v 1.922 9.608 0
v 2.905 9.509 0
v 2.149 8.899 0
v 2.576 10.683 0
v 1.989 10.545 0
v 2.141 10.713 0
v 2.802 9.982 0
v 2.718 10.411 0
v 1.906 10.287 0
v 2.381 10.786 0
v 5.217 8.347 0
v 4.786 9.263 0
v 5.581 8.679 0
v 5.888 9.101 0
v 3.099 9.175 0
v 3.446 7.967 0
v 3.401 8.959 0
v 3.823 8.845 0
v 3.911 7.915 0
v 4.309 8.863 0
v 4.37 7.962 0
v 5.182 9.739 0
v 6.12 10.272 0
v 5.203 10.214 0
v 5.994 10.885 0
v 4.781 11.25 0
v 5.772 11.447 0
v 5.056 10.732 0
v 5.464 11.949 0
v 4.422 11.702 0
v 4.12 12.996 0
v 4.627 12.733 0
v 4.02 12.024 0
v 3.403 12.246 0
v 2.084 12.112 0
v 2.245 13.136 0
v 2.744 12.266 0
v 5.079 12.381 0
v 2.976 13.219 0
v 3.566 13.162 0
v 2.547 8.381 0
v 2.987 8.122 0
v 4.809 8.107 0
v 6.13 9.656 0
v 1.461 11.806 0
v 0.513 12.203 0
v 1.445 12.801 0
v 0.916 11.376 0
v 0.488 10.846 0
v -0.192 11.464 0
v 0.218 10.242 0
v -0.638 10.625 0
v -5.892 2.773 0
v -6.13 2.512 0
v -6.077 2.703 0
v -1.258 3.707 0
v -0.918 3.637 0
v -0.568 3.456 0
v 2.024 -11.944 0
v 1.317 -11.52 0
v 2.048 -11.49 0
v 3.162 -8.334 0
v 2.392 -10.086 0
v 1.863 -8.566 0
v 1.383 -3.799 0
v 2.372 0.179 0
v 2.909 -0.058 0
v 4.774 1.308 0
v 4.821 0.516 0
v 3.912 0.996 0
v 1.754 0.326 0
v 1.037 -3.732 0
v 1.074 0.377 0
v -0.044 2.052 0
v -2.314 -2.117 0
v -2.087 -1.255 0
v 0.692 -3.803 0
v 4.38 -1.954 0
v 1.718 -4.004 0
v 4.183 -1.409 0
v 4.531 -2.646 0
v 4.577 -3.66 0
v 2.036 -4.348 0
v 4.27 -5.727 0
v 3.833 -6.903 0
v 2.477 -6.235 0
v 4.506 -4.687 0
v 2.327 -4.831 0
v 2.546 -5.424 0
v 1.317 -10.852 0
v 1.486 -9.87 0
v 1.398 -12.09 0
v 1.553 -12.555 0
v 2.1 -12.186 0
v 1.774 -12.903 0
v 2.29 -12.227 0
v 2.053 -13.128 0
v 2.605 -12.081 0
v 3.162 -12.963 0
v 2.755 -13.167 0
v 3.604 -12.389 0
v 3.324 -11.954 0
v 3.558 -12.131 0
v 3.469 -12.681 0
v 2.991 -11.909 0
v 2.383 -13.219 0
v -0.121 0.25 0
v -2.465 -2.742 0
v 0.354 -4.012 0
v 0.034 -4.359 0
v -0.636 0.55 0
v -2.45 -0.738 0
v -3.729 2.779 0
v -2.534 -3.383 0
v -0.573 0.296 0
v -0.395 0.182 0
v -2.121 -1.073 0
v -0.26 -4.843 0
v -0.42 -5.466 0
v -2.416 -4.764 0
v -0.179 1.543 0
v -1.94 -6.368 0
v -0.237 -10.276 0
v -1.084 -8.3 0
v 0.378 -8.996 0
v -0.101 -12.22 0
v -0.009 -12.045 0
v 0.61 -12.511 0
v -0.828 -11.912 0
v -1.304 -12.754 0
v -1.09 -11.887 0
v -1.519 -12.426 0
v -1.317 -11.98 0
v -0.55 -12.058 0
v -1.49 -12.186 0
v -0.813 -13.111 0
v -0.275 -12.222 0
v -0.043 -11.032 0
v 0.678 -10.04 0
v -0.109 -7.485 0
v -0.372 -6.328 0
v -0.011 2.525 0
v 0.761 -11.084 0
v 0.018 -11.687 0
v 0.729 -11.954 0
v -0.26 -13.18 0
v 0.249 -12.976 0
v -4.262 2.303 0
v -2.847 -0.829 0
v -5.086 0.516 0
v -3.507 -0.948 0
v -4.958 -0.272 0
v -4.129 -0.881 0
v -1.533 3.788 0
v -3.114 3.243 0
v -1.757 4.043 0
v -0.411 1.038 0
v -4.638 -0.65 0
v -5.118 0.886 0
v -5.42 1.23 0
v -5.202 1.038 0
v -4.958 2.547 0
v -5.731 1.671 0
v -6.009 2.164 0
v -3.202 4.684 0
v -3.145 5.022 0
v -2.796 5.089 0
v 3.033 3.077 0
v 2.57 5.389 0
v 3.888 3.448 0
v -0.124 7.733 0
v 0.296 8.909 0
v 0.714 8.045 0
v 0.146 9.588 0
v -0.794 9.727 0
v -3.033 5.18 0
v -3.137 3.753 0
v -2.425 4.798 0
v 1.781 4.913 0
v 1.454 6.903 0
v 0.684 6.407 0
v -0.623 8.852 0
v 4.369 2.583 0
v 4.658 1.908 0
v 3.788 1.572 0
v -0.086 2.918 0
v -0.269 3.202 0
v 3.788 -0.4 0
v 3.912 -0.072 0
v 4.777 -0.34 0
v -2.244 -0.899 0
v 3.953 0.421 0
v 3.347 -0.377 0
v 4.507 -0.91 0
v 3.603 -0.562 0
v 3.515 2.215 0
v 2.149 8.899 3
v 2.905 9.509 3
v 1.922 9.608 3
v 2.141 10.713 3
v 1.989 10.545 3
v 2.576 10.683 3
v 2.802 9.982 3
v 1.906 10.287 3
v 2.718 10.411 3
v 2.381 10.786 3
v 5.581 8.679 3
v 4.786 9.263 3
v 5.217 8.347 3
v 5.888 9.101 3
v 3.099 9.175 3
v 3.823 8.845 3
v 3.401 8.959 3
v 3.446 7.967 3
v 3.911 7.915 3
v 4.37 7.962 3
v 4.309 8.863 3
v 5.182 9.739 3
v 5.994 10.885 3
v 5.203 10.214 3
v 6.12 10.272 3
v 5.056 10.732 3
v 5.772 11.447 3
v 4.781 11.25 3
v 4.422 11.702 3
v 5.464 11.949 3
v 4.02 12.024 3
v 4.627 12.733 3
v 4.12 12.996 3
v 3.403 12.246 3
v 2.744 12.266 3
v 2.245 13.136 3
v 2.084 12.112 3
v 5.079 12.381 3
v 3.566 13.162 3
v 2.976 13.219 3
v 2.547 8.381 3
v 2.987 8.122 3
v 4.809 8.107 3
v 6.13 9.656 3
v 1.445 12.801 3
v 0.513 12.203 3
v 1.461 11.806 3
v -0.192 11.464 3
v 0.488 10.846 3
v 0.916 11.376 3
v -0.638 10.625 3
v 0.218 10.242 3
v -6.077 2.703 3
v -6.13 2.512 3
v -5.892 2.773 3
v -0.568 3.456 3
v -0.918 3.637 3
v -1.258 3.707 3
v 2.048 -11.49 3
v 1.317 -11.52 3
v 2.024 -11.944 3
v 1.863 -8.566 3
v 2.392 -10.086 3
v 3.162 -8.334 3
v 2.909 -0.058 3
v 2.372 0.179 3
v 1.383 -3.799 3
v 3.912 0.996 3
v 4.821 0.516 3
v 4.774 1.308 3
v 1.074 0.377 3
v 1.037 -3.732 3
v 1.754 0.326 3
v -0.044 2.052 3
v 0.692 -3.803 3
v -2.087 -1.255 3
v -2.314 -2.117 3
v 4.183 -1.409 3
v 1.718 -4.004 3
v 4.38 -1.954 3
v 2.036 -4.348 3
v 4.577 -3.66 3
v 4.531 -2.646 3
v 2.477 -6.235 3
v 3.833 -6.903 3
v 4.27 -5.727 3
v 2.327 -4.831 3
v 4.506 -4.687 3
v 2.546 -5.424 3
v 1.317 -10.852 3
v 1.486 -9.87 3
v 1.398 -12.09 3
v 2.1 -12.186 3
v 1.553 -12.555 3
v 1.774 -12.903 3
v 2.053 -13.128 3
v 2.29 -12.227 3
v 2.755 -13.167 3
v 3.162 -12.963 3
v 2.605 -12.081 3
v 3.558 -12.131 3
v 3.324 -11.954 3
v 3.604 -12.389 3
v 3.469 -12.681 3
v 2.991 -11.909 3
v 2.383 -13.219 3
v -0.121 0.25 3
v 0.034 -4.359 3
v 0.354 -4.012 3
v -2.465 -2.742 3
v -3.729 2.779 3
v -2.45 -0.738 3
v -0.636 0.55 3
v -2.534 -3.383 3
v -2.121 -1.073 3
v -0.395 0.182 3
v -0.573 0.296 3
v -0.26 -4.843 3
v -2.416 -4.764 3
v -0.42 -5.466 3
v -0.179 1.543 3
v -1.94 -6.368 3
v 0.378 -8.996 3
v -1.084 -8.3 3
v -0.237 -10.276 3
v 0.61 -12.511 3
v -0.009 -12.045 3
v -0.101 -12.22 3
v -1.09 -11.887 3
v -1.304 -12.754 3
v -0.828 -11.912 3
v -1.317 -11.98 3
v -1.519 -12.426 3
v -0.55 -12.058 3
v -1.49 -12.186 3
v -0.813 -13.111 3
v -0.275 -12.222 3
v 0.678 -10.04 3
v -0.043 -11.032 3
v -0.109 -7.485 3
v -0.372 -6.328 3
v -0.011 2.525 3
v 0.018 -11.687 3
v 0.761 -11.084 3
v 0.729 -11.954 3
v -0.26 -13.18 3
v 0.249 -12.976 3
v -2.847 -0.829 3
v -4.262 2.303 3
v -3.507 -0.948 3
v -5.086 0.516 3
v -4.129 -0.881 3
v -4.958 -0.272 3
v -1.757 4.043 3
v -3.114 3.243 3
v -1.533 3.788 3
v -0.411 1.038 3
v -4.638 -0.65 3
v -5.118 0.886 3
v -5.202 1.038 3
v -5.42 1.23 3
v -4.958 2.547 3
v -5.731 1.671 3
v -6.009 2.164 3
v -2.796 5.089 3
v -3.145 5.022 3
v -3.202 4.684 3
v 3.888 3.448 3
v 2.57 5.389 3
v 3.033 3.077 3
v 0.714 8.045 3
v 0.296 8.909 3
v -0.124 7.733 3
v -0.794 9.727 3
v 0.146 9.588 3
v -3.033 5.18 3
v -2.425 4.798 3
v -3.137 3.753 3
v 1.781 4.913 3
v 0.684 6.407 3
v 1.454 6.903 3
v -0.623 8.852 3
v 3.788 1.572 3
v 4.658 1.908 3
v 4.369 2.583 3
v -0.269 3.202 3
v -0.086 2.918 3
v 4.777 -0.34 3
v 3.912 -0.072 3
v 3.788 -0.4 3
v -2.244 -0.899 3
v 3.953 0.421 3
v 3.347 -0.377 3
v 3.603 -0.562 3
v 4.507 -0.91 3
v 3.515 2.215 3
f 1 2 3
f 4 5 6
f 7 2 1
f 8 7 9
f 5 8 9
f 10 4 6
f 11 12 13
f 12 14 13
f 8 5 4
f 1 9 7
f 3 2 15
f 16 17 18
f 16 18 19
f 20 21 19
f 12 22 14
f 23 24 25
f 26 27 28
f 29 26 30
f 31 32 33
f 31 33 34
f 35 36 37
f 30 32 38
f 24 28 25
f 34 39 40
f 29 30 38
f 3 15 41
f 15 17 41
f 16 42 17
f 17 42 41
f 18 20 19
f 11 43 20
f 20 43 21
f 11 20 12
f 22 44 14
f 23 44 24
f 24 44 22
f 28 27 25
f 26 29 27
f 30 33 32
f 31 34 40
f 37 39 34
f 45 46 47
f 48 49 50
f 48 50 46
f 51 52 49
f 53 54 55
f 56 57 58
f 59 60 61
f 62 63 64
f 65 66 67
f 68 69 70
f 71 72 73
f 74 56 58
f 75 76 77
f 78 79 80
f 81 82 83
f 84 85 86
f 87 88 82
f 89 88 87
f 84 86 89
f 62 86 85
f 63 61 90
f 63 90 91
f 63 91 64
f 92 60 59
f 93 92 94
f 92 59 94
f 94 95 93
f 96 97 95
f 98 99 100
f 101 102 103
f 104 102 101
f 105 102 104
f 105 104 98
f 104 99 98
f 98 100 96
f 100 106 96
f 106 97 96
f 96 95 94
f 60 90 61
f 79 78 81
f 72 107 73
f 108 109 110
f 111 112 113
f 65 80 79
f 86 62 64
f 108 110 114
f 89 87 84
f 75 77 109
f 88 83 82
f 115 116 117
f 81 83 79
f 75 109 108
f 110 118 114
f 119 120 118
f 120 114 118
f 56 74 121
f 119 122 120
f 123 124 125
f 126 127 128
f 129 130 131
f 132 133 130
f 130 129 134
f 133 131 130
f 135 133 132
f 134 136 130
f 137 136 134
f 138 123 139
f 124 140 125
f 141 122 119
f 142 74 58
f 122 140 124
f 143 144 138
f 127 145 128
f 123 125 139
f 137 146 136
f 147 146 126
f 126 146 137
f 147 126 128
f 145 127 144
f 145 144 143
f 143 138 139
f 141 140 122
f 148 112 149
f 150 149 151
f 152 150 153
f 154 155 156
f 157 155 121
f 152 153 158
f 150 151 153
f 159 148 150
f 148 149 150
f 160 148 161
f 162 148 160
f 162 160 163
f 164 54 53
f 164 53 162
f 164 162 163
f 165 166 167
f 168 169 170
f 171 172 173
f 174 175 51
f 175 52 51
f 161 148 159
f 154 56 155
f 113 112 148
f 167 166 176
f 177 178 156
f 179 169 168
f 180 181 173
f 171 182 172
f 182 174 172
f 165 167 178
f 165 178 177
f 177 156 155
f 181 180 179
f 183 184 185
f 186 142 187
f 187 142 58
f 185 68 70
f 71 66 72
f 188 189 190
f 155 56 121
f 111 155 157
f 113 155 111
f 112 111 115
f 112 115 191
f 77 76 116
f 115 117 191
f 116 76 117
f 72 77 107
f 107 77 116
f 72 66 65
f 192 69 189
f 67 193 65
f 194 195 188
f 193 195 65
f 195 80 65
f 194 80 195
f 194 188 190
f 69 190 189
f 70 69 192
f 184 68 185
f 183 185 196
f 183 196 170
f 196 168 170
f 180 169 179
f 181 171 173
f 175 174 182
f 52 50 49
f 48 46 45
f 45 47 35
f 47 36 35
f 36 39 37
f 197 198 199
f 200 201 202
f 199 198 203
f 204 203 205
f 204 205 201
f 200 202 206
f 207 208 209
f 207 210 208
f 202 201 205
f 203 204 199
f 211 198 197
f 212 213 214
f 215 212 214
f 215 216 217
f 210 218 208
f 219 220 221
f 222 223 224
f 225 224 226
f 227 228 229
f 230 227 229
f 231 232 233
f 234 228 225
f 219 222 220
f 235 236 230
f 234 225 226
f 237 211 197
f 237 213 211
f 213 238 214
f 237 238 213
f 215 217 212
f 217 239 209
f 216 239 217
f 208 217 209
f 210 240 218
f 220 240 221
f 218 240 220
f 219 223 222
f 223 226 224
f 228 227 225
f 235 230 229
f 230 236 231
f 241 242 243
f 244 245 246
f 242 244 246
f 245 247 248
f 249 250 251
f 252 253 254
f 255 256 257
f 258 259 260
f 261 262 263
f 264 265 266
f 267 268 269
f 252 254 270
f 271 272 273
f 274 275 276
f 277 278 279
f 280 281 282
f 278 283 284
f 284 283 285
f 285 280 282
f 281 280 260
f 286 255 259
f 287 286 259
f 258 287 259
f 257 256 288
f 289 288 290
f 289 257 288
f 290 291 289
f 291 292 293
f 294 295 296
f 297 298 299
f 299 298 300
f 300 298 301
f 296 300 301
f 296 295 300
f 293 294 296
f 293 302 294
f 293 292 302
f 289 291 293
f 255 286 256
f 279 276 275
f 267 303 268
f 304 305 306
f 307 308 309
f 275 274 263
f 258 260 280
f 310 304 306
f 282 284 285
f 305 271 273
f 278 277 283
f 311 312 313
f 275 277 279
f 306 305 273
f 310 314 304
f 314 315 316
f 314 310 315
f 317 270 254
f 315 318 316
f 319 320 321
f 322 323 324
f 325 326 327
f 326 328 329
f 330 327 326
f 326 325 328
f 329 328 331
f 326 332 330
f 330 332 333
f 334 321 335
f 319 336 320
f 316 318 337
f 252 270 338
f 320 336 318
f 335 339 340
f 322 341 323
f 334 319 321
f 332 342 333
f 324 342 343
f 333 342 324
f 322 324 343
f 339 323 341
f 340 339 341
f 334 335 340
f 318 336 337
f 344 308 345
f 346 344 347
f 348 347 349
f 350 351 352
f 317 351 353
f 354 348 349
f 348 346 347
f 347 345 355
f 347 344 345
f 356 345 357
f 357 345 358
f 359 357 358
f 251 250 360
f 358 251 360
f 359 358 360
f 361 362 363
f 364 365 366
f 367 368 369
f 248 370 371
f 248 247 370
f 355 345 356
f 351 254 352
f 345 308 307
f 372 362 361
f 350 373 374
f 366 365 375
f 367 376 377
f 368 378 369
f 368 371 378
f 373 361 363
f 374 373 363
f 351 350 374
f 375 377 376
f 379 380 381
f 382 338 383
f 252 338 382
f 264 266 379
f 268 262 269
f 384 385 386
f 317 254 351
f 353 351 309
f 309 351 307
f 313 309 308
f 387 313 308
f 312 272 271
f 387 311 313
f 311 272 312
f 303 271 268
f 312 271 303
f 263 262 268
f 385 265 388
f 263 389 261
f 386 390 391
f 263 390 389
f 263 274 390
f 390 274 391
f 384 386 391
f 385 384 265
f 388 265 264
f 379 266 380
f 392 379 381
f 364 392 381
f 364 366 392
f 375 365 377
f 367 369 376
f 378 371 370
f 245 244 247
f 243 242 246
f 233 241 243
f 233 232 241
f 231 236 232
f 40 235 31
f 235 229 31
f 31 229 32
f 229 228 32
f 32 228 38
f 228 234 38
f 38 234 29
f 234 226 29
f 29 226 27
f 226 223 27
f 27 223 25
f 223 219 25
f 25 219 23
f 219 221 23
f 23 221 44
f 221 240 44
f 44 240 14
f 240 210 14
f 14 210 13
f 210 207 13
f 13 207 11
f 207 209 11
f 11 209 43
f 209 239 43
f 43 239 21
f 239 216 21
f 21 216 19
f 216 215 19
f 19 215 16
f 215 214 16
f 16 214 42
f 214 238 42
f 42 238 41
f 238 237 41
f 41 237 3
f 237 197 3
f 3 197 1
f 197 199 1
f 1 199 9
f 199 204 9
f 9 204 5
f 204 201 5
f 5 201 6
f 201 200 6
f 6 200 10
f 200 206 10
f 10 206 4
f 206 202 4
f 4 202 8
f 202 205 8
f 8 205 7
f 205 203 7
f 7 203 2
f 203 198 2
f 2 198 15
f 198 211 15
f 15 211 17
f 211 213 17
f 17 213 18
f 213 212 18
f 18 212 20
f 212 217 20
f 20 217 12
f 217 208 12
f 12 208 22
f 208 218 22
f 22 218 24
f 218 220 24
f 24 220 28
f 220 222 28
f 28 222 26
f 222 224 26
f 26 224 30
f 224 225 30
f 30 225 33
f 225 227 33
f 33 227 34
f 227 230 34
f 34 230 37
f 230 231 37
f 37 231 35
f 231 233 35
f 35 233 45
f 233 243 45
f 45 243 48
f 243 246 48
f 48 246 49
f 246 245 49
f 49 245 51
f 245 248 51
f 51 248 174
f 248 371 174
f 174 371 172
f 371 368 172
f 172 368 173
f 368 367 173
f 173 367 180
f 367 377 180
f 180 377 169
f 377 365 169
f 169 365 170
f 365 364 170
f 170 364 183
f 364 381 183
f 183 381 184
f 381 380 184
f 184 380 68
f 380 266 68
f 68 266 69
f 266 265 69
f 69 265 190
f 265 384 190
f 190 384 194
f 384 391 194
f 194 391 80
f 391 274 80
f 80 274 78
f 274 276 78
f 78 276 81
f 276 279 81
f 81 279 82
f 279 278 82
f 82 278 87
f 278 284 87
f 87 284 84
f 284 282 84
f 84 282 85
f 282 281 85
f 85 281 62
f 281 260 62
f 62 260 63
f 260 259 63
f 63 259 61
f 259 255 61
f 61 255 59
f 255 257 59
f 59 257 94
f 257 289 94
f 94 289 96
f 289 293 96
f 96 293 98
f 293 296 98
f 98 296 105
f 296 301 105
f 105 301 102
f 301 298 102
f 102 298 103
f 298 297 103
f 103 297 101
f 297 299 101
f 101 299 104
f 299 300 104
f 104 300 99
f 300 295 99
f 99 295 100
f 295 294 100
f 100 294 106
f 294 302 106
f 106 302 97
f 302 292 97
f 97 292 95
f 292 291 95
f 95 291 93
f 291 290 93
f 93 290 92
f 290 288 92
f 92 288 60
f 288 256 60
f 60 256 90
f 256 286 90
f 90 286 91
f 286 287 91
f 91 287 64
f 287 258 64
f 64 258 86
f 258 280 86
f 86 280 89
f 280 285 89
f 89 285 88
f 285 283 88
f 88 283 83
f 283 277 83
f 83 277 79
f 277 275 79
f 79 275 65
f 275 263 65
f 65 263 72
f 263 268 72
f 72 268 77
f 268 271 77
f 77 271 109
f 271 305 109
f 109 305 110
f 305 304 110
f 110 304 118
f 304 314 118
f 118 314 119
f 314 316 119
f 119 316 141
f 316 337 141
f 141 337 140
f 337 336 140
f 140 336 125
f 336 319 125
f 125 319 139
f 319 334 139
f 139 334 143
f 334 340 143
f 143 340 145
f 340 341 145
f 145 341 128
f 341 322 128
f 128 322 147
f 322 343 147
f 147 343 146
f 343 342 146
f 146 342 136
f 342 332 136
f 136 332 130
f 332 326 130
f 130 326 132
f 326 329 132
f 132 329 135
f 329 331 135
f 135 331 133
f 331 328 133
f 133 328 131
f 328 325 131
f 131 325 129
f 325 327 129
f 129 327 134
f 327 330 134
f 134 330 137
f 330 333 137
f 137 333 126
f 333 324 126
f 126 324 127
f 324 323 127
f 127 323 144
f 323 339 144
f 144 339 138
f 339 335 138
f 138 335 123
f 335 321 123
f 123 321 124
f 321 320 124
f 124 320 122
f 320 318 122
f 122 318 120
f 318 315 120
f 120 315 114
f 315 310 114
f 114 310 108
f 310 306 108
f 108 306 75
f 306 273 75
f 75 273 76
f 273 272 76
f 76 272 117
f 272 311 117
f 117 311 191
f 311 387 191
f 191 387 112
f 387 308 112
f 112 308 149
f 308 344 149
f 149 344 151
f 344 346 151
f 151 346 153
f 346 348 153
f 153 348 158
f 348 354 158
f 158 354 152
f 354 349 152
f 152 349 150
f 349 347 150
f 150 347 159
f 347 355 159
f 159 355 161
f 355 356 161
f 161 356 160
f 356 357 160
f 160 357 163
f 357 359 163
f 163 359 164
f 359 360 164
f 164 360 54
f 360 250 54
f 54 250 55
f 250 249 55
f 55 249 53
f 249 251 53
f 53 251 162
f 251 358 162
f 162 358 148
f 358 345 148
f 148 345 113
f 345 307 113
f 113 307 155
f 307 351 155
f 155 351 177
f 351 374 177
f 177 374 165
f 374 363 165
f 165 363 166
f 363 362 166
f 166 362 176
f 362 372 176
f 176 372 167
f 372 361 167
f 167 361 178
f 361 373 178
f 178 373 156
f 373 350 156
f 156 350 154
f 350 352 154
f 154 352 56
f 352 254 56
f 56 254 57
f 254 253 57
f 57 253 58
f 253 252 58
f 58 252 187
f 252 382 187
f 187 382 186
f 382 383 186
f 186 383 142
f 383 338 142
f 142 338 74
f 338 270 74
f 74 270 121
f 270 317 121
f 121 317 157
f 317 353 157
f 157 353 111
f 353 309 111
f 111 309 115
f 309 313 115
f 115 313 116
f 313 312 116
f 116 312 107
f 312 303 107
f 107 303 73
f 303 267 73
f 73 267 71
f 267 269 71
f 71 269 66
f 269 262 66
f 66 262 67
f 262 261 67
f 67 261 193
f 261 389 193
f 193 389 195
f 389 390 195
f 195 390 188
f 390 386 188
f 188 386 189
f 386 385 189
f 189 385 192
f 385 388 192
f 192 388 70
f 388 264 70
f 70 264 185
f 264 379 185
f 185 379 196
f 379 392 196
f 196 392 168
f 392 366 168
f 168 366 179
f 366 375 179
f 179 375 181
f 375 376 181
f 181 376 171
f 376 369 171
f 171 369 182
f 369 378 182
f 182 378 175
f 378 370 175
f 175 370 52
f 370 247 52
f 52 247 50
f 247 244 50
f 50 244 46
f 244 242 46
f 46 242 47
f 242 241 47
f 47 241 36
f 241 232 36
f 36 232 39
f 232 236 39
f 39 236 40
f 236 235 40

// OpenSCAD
// Module names are of the form poly_<inkscape-path-id>().  As a result,
// you can associate a polygon in this OpenSCAD program with the corresponding
// SVG element in the Inkscape document by looking for the XML element with
// the attribute id="inkscape-path-id".

// fudge value is used to ensure that subtracted solids are a tad taller
// in the z dimension than the polygon being subtracted from.  This helps
// keep the resulting .stl file manifold.
fudge = 0.1;

module poly_path8(h)
{
  scale([25.4/90, -25.4/90, 1]) union()
  {
    linear_extrude(height=h)
      polygon([[5.119886,-45.358069],[1.816879,-43.239982],[-0.680768,-40.620954],[-2.261304,-37.647412],[-2.812983,-34.465787],[-2.207999,-31.367010],[-0.439288,-27.401217],[2.423790,-22.703279],[6.311872,-17.408063],[10.745852,-10.903521],[12.456121,-7.847773],[13.422682,-5.570413],[13.861970,-3.530679],[14.008399,-1.490945],[13.861970,0.255930],[13.422682,1.417088],[12.765035,1.992530],[11.860770,1.334883],[10.307207,0.206478],[8.402984,-0.632921],[6.213610,-1.156342],[3.804592,-1.336809],[-0.429012,-0.884677],[-1.400069,-0.643197],[-2.032027,-1.049089],[-2.252955,-1.948216],[-1.456586,-3.679677],[-0.635169,-5.465729],[-0.156705,-7.271048],[-0.040461,-8.945351],[-0.305703,-10.338355],[-0.954359,-11.347304],[-2.011476,-12.244505],[-3.253555,-12.887380],[-4.457101,-13.133356],[-5.433296,-13.421077],[-6.224528,-14.325341],[-8.593085,-17.002171],[-9.906453,-18.030387],[-10.745852,-18.353431],[-11.144680,-17.794687],[-11.346983,-16.596279],[-11.115779,-13.297768],[-11.033573,-11.489238],[-13.212029,-9.845120],[-15.102765,-8.159899],[-17.568942,-9.023061],[-20.877730,-9.824568],[-21.534092,-9.577951],[-21.720340,-8.899752],[-21.293255,-7.667948],[-20.307426,-5.919788],[-19.205996,-4.356592],[-18.432104,-3.679677],[-18.134108,-3.140201],[-18.021075,-1.830045],[-17.568942,0.964956],[-16.434758,2.302086],[-14.630081,3.122861],[-12.424651,3.357918],[-10.088205,2.937898],[-8.680429,2.614212],[-7.950852,3.184515],[-7.515418,3.801060],[-7.395962,4.448431],[-8.197470,7.500325],[-8.733494,9.716191],[-8.979068,11.986969],[-8.562258,16.882073],[-6.873826,22.563272],[-3.840557,29.408197],[-0.840042,36.411112],[-0.152852,39.089869],[0.064223,41.410259],[-0.030827,42.679312],[-0.357082,43.300994],[-0.976195,43.306132],[-1.949821,42.725553],[-2.932439,42.206628],[-3.861108,42.119285],[-4.666469,42.448108],[-5.279160,43.177686],[-5.381918,44.030572],[-4.621513,45.191730],[-2.879775,46.455646],[-0.922247,46.702264],[0.881144,45.977824],[2.160474,44.328568],[2.581779,42.355627],[2.694812,39.272905],[2.401954,35.573640],[1.338415,31.874374],[-0.384698,26.523284],[-1.317863,22.420696],[-1.488055,19.366233],[-0.922247,17.159518],[0.120660,15.444915],[1.255567,14.216804],[2.451165,13.476148],[3.676145,13.223911],[4.899199,13.461056],[6.089017,14.188546],[7.214290,15.407344],[8.243710,17.118415],[9.019529,19.219804],[8.778049,22.091872],[6.599592,30.353565],[5.263747,34.972509],[4.667754,38.450846],[4.667031,40.817236],[4.954832,42.839229],[5.503701,44.484551],[6.286182,45.720931],[7.274821,46.516096],[8.442161,46.837775],[9.760746,46.653695],[11.203123,45.931583],[12.292993,44.933552],[12.770173,43.896987],[12.607688,42.983731],[11.778564,42.355627],[10.596854,42.196353],[9.230181,42.807759],[8.112695,43.324115],[7.442203,43.177686],[7.172465,42.322230],[7.257240,40.711509],[8.474915,35.738052],[11.203123,29.531506],[13.581956,24.457861],[15.128455,20.293618],[15.965927,16.607197],[16.217683,12.967017],[16.053271,9.375647],[15.518933,6.924884],[14.820182,4.993045],[15.971065,3.225618],[16.926709,1.206436],[17.080845,-1.830045],[16.916433,-4.635321],[16.505403,-6.762399],[15.482325,-9.151508],[13.777195,-12.218815],[9.106872,-19.093284],[5.151998,-24.458503],[2.530400,-28.505859],[1.049410,-31.566744],[0.516356,-33.972552],[0.774132,-36.288928],[1.730820,-38.430937],[3.245287,-40.308989],[5.176403,-41.833491],[7.383037,-42.914852],[9.724059,-43.463480],[12.058337,-43.389783],[14.244741,-42.604171],[15.668573,-41.463564],[16.942122,-39.860549],[17.915106,-38.026330],[18.437242,-36.192111],[18.360174,-34.506890],[16.957536,-32.821669],[15.267177,-31.403617],[13.545991,-31.341963],[12.050229,-31.745928],[10.982194,-32.508259],[10.291793,-33.694464],[9.928931,-35.370052],[9.632219,-36.890219],[9.127424,-37.851642],[8.437665,-38.219642],[7.586063,-37.959538],[7.049397,-37.365150],[6.753086,-36.449004],[6.810245,-34.044482],[7.614964,-31.532064],[9.024666,-29.697845],[10.583608,-28.777283],[12.209503,-28.229056],[13.857555,-28.044013],[15.482967,-28.213001],[17.040946,-28.726868],[18.486694,-29.576463],[19.775416,-30.752633],[20.862316,-32.246228],[21.720340,-34.214031],[21.684375,-36.397626],[21.239468,-38.569178],[20.452571,-40.560584],[19.359329,-42.338126],[17.995385,-43.868087],[16.396384,-45.116749],[14.597970,-46.050396],[12.635785,-46.635311],[10.545476,-46.837775],[7.955990,-46.544916],[5.119886,-45.358069]]);
  }
}

module gato1(h)
{

poly_path8(h);
}

gato1(3);
